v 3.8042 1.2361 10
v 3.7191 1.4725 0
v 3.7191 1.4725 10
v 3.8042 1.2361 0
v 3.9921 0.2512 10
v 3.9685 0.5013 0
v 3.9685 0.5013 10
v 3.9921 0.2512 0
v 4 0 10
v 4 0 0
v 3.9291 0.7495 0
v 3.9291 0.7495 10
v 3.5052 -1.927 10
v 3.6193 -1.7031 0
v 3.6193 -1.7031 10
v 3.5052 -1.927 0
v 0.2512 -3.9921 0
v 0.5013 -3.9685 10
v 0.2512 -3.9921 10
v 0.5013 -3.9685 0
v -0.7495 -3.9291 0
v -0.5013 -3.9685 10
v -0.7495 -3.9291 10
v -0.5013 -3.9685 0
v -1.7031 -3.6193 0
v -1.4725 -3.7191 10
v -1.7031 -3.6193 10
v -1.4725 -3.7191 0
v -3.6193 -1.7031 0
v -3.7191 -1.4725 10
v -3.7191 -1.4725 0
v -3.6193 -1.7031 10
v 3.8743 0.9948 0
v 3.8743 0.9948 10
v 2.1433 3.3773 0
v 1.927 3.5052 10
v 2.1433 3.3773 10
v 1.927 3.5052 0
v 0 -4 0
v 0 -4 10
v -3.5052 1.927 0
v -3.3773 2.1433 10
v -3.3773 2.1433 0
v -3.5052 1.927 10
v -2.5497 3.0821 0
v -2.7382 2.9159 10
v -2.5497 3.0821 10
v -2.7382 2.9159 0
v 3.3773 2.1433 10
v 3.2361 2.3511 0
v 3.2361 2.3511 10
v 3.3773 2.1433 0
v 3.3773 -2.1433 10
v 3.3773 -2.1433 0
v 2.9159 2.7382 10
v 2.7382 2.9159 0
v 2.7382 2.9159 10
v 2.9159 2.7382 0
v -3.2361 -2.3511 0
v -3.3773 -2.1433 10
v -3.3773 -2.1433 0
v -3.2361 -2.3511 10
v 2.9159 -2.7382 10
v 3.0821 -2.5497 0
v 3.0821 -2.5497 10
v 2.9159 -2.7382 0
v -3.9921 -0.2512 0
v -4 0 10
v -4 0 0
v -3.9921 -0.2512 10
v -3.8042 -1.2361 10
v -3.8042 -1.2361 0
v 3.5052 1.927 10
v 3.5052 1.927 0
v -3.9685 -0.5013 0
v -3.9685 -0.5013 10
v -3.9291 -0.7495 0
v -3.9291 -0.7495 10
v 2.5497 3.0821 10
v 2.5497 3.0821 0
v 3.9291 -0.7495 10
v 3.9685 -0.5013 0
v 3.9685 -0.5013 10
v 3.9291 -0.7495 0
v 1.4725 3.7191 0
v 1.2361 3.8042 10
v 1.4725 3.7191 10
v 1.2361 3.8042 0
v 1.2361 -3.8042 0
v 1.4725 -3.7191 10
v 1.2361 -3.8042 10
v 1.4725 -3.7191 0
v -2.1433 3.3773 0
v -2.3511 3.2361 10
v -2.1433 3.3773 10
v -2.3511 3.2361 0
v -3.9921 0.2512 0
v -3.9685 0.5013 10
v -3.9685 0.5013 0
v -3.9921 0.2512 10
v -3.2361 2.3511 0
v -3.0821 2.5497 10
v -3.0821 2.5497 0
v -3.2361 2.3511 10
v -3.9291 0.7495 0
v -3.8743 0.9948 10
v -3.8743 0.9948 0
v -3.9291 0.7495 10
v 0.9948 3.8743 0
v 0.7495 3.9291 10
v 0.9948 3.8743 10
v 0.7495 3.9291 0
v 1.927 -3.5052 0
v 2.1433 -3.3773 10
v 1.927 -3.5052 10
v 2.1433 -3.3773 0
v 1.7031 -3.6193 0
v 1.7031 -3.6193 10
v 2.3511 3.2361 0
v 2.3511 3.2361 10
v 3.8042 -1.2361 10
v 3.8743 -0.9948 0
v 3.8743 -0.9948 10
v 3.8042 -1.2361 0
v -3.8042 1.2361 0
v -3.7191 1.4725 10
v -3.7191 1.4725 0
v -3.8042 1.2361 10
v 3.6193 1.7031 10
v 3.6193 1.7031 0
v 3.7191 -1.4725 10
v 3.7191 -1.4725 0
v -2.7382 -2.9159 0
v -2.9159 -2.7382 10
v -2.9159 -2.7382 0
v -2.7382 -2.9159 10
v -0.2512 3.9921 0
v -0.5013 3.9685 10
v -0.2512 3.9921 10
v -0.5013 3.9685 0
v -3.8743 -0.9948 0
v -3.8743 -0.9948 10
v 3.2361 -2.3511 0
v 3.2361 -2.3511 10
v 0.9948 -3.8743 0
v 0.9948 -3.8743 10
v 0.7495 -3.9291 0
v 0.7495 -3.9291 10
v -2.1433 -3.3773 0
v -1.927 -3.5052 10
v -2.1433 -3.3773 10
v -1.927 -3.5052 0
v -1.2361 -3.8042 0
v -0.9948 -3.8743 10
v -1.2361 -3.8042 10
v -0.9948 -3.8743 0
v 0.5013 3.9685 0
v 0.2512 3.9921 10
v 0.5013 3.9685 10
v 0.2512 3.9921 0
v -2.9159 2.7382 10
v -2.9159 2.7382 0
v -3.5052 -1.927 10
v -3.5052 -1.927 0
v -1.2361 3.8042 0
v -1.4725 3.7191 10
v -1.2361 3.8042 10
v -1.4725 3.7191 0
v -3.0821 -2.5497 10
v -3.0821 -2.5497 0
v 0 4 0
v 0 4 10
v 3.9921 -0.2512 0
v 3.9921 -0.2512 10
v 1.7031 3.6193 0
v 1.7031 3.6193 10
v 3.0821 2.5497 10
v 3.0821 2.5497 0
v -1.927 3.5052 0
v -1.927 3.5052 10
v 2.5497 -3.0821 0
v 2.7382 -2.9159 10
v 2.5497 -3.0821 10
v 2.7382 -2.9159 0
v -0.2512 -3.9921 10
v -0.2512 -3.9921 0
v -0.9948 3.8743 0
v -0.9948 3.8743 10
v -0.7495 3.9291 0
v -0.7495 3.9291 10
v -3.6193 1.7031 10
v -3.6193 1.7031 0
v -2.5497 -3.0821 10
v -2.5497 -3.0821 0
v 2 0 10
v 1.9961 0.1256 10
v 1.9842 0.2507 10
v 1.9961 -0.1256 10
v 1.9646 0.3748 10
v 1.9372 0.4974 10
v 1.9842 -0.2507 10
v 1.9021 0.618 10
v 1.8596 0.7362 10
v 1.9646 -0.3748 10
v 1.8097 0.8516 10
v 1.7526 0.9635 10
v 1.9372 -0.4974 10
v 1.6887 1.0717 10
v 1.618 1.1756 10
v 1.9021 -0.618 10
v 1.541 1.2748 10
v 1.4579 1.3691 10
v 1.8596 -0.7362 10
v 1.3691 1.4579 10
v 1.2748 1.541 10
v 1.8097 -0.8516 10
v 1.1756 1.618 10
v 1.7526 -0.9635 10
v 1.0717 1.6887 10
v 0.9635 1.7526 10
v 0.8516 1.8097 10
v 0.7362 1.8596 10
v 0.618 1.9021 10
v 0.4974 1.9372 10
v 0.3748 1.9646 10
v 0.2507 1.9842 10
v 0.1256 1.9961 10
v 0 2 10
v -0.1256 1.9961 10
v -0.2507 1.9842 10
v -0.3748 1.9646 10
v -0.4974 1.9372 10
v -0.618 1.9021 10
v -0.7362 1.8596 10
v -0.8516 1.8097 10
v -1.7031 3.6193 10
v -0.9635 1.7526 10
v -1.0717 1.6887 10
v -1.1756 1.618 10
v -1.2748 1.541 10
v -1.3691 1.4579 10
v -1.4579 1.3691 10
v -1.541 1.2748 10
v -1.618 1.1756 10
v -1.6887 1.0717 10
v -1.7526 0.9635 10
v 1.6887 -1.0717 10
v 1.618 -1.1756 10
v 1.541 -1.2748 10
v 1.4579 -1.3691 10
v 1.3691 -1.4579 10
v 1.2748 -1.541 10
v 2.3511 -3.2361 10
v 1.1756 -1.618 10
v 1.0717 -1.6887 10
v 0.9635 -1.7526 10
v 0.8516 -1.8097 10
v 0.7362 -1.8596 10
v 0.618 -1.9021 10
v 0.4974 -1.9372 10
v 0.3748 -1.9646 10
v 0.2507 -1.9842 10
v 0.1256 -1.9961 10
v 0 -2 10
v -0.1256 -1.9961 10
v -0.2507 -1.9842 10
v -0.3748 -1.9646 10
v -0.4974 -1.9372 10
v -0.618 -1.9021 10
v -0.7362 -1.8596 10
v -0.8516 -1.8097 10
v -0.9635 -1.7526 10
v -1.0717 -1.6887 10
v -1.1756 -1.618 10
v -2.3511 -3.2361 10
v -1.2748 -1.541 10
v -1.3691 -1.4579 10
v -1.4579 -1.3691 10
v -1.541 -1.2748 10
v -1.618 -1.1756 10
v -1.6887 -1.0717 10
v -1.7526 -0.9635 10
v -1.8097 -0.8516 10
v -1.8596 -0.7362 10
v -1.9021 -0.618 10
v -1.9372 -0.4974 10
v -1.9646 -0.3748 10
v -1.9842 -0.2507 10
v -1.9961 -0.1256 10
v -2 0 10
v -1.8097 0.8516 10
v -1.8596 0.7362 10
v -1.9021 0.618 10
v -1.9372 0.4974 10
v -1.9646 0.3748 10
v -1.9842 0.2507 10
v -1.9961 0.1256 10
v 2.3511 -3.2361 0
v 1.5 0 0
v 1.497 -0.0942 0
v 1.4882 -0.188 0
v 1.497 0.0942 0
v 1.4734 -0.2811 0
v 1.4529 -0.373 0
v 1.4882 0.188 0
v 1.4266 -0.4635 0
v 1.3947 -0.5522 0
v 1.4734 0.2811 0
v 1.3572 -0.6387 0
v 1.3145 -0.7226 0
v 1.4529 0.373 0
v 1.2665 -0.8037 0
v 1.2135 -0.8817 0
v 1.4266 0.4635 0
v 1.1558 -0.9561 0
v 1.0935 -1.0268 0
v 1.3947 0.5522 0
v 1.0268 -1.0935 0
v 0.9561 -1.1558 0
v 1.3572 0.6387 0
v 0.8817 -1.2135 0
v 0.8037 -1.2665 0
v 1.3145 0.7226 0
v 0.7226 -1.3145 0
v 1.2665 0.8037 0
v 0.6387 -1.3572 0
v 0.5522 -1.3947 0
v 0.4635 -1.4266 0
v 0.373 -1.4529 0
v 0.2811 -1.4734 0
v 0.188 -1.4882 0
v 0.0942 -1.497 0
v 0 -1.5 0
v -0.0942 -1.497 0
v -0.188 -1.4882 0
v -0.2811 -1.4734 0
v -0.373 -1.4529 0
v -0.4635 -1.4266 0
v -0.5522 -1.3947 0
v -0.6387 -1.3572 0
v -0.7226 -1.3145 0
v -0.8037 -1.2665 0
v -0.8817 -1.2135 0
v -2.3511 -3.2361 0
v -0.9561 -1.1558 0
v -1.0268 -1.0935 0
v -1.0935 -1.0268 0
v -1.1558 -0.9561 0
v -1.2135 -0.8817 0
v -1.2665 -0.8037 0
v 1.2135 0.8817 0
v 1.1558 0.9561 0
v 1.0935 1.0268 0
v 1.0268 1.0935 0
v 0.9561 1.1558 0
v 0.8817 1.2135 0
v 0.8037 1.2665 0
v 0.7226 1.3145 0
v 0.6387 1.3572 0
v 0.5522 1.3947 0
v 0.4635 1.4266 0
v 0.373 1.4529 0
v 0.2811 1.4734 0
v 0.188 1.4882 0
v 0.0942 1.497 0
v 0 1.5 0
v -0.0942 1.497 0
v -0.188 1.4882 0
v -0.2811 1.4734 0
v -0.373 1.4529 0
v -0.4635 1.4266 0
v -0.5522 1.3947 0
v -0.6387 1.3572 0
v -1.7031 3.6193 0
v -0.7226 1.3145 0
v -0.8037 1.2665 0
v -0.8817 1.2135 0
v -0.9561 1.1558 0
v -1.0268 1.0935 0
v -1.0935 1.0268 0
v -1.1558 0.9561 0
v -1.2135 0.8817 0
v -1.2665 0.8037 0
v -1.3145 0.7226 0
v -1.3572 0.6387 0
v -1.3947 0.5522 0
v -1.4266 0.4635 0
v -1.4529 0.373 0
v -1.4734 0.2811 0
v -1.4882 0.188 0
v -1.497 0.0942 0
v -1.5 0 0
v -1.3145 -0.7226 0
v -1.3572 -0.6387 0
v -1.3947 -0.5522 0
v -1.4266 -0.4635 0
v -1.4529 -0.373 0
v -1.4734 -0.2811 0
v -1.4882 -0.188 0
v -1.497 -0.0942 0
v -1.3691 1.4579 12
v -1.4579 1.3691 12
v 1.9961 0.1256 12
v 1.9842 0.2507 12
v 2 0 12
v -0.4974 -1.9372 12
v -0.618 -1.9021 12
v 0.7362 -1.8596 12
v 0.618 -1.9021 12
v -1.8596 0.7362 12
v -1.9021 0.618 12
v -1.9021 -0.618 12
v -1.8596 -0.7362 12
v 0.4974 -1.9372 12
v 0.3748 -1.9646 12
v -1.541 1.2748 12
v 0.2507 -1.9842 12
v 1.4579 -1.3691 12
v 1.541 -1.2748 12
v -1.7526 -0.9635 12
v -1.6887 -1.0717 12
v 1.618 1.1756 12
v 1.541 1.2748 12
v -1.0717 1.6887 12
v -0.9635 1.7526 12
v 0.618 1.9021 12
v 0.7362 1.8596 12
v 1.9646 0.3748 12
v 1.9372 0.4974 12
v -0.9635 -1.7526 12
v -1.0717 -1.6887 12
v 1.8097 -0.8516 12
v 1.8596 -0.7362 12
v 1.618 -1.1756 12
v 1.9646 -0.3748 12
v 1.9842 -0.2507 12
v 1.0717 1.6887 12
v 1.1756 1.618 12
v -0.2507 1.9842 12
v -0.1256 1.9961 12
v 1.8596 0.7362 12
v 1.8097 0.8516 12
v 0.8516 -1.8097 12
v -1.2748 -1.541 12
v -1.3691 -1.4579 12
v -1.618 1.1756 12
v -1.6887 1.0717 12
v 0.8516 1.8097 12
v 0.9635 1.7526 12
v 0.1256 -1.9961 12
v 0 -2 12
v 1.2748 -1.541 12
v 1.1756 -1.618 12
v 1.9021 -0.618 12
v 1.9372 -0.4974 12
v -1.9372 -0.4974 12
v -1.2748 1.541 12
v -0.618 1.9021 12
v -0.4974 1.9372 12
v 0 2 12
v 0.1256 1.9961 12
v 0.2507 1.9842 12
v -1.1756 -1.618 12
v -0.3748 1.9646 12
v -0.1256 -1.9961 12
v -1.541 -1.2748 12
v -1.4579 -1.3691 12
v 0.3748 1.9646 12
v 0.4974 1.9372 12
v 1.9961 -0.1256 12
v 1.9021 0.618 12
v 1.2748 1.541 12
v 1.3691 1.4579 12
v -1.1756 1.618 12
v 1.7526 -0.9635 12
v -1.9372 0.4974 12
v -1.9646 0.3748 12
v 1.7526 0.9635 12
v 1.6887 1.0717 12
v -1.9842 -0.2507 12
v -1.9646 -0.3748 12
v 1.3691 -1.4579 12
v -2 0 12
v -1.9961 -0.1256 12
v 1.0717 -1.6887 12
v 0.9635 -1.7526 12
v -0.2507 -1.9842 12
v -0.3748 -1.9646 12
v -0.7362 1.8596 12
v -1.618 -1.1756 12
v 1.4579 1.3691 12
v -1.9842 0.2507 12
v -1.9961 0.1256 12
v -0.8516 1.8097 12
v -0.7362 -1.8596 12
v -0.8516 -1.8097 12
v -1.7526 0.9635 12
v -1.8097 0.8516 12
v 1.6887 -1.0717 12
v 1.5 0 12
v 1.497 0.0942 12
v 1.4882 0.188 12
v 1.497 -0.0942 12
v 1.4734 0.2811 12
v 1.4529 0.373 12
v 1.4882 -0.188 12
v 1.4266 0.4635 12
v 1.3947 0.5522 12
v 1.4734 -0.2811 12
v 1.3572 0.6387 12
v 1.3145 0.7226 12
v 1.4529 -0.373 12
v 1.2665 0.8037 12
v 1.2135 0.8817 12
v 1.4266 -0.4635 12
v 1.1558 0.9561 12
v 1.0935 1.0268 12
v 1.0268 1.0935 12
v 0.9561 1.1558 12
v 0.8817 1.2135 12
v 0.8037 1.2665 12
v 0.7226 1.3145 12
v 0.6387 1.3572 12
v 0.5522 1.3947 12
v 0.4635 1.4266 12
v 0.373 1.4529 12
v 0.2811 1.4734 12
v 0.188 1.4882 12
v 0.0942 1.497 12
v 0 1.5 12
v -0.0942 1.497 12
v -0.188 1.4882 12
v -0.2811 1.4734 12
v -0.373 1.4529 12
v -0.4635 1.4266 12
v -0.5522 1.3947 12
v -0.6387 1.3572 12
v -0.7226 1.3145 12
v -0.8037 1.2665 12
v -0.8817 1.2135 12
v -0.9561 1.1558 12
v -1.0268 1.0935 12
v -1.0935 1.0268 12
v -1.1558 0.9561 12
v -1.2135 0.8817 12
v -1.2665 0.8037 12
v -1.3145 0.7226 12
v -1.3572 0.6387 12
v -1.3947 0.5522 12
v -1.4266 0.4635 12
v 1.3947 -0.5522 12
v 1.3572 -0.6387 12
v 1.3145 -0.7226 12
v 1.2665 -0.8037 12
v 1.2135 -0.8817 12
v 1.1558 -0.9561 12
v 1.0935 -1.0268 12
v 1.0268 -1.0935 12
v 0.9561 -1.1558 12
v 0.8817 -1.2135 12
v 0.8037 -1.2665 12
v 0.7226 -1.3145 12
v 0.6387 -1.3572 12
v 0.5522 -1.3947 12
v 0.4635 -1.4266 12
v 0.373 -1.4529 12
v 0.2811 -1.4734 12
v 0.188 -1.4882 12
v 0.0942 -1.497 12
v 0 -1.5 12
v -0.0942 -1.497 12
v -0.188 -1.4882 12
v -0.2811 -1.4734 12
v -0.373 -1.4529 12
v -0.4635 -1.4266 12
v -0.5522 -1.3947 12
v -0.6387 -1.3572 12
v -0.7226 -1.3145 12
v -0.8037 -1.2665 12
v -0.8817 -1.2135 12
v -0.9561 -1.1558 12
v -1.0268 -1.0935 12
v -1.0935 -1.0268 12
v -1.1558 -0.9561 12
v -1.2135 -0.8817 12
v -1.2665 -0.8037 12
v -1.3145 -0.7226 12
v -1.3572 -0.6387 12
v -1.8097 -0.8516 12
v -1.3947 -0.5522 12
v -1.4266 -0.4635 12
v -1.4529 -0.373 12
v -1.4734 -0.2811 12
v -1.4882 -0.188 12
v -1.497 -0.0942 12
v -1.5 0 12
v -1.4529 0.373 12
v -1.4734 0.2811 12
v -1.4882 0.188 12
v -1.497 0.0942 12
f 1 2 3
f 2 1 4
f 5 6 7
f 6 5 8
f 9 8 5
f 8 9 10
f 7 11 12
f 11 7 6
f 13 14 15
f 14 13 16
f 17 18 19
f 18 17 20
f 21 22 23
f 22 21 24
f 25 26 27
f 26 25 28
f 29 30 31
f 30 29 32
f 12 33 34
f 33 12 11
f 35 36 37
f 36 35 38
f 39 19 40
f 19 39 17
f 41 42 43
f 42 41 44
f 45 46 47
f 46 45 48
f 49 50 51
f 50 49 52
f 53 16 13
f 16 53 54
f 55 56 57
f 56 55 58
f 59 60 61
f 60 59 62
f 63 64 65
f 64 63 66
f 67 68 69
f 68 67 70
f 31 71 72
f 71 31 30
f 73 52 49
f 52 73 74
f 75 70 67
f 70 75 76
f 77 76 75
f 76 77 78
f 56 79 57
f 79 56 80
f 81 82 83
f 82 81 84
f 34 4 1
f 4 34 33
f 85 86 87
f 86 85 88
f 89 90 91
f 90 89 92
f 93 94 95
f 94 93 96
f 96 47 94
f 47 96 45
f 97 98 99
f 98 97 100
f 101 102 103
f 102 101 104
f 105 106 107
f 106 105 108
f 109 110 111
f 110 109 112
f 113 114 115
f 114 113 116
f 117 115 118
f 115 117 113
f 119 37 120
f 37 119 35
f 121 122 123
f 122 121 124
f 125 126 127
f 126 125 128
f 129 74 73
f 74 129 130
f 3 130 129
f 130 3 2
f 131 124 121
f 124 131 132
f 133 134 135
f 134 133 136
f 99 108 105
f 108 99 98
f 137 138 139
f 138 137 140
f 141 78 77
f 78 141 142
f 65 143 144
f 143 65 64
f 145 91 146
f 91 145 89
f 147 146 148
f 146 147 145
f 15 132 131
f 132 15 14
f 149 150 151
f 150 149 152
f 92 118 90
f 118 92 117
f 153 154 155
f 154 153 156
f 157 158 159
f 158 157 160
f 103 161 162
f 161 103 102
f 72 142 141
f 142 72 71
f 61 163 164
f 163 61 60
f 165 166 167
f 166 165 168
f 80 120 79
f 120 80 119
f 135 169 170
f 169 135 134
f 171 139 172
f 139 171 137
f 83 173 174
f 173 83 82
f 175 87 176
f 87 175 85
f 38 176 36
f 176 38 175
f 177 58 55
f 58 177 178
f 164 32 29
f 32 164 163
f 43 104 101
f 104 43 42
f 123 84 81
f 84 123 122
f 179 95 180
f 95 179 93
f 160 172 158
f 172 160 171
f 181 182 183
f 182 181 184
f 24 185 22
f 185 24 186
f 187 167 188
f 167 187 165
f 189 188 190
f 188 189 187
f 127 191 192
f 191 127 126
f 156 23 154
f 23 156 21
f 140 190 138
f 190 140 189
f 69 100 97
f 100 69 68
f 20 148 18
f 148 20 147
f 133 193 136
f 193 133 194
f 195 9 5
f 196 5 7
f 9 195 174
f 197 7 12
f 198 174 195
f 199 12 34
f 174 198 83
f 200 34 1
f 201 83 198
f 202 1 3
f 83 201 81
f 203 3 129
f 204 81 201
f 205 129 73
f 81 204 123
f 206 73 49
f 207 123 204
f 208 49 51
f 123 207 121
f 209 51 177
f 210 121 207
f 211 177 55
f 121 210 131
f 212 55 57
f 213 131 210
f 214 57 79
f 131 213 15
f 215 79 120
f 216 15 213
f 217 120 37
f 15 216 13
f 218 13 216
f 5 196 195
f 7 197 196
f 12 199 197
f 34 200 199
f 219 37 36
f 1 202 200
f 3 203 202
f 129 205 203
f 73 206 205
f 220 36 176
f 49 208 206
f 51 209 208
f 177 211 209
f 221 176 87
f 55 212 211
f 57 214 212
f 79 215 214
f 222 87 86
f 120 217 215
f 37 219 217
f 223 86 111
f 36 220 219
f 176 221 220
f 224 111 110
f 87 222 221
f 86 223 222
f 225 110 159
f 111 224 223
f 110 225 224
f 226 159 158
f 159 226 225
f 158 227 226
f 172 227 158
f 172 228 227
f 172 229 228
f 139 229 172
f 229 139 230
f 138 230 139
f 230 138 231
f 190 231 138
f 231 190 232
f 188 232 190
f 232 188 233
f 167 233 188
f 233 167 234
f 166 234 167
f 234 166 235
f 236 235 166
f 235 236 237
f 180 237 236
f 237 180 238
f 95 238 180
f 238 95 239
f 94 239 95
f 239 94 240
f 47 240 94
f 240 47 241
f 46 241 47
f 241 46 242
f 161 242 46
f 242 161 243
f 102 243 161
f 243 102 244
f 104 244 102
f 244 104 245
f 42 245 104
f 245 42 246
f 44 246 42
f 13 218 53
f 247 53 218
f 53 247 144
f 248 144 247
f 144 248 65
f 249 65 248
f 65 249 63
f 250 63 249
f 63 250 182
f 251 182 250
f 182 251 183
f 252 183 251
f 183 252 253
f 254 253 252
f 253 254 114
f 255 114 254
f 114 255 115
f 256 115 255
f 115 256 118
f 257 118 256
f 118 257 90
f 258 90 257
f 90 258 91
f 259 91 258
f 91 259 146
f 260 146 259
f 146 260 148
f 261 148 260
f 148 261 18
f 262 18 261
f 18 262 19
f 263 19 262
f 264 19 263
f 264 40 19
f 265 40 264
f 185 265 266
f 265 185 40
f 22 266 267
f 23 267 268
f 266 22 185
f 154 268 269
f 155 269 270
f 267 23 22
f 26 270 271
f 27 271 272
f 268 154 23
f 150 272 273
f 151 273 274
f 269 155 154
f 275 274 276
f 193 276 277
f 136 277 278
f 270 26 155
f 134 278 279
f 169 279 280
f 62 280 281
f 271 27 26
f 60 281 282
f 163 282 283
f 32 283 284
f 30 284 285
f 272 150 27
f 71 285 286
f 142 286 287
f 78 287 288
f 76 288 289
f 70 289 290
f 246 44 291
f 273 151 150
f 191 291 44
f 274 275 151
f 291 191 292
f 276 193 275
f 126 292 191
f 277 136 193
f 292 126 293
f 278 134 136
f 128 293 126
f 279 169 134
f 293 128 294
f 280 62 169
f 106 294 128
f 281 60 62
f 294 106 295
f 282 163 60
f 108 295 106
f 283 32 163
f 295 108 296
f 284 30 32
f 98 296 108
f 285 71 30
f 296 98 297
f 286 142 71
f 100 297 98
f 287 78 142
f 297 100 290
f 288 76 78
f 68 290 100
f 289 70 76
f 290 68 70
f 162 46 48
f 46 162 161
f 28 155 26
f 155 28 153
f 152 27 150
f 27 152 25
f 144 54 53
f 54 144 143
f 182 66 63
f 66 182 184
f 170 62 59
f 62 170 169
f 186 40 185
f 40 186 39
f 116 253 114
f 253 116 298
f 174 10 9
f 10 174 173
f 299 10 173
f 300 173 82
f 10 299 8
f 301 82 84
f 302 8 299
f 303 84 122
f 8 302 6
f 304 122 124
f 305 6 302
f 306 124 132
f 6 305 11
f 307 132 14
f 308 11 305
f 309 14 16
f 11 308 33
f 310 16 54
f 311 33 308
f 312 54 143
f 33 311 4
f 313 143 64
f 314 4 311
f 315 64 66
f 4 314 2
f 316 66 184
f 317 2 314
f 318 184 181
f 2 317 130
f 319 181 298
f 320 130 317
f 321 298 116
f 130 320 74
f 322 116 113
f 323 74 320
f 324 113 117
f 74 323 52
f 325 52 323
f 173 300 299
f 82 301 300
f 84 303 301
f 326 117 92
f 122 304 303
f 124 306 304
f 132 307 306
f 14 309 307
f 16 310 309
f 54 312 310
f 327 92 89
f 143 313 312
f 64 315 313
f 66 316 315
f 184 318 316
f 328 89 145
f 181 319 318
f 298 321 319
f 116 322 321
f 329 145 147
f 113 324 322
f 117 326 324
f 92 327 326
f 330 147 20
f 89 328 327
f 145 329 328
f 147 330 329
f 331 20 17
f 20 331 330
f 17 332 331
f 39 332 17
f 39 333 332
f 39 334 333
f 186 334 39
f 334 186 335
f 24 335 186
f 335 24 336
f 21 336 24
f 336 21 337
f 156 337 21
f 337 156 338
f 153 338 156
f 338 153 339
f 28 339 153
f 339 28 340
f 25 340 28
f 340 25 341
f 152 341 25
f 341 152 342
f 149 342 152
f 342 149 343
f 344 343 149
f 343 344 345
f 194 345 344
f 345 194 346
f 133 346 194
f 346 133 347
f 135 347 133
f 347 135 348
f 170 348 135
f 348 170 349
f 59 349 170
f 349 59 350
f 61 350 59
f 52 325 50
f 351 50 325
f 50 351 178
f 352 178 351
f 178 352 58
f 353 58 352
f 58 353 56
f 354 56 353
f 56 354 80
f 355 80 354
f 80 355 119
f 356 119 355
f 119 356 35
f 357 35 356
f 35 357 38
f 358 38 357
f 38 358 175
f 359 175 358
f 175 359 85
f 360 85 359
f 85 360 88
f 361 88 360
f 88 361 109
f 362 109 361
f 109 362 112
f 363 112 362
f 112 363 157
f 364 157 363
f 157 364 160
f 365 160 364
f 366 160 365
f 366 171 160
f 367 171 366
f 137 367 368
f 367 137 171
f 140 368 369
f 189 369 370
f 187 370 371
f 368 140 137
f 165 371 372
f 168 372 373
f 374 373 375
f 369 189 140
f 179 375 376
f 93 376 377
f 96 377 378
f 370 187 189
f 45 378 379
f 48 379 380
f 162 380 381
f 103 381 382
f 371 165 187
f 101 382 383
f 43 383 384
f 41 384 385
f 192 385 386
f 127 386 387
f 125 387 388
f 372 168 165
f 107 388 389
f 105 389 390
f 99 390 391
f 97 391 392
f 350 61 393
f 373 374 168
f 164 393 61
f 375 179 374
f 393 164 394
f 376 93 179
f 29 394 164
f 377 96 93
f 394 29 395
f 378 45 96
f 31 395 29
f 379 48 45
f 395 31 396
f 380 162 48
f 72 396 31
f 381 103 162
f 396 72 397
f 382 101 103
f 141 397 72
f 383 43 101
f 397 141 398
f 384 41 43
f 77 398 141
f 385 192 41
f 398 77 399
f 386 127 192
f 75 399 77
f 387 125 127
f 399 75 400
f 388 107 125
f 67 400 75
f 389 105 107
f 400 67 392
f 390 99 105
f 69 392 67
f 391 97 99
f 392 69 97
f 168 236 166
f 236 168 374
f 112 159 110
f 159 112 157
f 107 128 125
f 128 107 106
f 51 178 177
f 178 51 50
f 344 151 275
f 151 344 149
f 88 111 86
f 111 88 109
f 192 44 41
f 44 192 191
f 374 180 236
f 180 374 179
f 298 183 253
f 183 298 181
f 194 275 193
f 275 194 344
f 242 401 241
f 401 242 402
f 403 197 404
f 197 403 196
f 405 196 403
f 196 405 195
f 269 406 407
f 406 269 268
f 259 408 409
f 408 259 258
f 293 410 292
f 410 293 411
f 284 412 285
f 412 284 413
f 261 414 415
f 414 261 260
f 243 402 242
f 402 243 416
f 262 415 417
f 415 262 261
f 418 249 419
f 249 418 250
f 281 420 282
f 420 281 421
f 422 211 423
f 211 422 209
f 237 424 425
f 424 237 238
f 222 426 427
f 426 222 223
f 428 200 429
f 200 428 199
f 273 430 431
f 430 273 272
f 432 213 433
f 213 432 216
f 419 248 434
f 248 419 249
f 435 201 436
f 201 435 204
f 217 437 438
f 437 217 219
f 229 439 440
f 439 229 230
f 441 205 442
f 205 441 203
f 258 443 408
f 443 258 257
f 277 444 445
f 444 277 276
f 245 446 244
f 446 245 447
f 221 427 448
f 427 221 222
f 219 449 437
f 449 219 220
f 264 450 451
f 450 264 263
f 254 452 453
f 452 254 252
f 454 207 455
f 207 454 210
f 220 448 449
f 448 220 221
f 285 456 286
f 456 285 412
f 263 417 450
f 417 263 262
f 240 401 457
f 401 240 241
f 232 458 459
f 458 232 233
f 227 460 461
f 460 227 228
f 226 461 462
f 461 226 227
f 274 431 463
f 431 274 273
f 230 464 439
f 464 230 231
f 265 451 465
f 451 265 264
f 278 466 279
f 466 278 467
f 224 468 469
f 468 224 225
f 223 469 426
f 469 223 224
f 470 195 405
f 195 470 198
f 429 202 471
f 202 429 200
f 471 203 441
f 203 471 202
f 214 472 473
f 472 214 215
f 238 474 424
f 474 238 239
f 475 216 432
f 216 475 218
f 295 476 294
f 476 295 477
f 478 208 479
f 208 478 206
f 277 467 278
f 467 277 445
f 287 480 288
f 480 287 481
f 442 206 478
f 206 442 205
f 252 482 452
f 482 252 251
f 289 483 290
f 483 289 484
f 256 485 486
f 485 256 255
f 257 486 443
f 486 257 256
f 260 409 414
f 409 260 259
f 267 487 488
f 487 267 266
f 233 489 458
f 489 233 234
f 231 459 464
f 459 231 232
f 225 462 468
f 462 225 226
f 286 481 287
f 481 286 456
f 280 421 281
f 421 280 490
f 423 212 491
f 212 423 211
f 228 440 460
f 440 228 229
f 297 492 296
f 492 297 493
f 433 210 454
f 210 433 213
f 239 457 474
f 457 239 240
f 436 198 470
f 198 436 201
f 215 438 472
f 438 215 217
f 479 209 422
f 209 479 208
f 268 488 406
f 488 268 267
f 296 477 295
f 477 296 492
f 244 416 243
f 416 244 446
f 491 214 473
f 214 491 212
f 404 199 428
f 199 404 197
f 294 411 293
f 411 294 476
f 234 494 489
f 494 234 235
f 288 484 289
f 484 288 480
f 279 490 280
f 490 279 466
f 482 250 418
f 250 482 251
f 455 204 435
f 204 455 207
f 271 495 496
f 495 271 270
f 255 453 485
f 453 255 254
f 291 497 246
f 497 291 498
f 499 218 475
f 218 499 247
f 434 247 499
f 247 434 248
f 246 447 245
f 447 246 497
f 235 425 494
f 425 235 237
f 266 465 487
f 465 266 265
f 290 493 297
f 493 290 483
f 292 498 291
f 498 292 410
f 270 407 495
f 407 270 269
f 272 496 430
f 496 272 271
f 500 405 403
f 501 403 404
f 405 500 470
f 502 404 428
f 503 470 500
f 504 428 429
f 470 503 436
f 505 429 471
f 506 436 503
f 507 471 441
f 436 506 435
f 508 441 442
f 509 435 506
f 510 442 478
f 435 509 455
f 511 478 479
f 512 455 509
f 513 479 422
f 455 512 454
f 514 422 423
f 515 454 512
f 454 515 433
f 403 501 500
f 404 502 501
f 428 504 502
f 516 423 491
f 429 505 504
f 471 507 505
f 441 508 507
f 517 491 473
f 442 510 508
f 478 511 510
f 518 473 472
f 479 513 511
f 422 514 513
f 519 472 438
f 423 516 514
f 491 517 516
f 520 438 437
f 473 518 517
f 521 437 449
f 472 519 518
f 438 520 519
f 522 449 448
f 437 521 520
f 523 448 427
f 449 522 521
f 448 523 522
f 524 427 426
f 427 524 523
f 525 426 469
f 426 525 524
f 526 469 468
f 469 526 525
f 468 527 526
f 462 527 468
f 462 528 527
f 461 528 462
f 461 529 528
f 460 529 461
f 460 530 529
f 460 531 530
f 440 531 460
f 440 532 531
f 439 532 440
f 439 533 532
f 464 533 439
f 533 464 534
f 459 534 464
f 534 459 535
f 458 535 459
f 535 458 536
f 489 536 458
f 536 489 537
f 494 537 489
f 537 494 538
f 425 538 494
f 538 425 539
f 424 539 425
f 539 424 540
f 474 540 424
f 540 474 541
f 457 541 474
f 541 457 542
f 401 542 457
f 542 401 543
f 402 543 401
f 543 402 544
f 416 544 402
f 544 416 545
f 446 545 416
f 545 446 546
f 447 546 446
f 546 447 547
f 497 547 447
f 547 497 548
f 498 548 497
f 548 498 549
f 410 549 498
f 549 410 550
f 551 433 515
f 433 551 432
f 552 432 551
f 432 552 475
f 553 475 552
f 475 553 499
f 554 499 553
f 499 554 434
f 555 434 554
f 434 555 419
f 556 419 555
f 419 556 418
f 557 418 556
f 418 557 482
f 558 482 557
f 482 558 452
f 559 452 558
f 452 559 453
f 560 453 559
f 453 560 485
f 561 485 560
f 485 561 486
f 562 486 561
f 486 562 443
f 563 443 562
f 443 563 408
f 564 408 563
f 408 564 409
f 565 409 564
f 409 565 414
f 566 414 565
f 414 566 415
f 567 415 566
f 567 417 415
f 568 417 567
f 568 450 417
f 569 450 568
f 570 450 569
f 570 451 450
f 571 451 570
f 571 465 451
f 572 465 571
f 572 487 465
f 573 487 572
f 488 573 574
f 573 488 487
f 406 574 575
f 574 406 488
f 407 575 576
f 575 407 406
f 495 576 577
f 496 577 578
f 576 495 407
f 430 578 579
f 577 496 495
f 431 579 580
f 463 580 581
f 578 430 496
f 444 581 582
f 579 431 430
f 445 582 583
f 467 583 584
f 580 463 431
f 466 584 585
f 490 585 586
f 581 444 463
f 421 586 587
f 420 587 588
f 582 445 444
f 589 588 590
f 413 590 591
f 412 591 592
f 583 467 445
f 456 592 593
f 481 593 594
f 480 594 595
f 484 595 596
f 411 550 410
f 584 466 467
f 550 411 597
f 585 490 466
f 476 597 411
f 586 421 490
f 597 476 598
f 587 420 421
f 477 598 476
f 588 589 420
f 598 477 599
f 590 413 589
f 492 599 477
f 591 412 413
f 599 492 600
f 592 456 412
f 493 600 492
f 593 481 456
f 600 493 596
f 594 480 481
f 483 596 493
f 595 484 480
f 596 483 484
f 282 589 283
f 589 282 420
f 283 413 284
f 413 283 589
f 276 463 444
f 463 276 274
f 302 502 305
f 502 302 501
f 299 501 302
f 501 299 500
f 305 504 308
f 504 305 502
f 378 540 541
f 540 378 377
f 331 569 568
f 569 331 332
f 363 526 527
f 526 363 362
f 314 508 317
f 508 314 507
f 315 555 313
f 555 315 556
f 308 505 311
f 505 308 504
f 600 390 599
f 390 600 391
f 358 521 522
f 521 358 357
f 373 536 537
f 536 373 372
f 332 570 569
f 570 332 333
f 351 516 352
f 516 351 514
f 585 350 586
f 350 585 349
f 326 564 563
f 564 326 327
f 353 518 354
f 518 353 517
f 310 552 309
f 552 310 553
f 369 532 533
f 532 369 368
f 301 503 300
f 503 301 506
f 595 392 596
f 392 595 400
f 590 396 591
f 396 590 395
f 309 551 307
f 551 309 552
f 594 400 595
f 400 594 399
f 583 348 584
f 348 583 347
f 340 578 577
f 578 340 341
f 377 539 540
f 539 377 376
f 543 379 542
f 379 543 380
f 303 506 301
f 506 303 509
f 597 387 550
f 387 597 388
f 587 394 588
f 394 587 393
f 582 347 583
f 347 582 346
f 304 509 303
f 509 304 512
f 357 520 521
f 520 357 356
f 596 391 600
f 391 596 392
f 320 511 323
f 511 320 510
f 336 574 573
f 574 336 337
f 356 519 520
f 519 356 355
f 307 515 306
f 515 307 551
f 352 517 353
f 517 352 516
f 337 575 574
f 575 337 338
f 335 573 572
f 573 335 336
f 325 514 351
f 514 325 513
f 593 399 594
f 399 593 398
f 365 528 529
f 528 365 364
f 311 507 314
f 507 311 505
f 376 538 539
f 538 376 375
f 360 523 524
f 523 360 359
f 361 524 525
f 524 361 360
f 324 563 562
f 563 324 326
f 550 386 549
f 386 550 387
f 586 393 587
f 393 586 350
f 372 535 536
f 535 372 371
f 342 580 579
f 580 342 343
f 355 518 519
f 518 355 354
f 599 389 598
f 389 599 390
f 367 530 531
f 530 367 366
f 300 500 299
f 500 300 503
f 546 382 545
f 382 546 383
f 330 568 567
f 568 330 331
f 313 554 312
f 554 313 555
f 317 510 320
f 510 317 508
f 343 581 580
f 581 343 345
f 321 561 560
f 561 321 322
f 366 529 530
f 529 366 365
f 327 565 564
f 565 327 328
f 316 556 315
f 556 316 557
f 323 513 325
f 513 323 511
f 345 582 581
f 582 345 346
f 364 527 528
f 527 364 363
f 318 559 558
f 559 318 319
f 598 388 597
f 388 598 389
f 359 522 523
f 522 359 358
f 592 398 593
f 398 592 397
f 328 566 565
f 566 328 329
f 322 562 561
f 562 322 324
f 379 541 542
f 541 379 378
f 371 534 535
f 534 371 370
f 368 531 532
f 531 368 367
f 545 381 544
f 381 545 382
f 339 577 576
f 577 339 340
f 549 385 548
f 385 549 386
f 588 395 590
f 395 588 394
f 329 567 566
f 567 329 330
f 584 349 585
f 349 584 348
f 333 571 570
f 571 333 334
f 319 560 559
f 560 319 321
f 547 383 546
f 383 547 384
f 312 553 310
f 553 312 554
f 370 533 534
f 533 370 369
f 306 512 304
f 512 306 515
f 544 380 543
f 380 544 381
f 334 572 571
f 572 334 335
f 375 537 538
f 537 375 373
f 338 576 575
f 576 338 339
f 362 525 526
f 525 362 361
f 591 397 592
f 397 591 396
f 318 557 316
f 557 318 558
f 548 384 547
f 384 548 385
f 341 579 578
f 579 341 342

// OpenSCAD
$fn=100;

standoff_diameter=8;
standoff_height=10;
pcb_height=2;
mounting_hole_diameter=4;
screw_diameter=3;

difference(){
  union(){
    cylinder(h=standoff_height,r=standoff_diameter/2);
    translate([0,0,standoff_height])
      cylinder(h=pcb_height,r=mounting_hole_diameter/2);
  }
  cylinder(h=standoff_height+pcb_height,r=screw_diameter/2);
}
